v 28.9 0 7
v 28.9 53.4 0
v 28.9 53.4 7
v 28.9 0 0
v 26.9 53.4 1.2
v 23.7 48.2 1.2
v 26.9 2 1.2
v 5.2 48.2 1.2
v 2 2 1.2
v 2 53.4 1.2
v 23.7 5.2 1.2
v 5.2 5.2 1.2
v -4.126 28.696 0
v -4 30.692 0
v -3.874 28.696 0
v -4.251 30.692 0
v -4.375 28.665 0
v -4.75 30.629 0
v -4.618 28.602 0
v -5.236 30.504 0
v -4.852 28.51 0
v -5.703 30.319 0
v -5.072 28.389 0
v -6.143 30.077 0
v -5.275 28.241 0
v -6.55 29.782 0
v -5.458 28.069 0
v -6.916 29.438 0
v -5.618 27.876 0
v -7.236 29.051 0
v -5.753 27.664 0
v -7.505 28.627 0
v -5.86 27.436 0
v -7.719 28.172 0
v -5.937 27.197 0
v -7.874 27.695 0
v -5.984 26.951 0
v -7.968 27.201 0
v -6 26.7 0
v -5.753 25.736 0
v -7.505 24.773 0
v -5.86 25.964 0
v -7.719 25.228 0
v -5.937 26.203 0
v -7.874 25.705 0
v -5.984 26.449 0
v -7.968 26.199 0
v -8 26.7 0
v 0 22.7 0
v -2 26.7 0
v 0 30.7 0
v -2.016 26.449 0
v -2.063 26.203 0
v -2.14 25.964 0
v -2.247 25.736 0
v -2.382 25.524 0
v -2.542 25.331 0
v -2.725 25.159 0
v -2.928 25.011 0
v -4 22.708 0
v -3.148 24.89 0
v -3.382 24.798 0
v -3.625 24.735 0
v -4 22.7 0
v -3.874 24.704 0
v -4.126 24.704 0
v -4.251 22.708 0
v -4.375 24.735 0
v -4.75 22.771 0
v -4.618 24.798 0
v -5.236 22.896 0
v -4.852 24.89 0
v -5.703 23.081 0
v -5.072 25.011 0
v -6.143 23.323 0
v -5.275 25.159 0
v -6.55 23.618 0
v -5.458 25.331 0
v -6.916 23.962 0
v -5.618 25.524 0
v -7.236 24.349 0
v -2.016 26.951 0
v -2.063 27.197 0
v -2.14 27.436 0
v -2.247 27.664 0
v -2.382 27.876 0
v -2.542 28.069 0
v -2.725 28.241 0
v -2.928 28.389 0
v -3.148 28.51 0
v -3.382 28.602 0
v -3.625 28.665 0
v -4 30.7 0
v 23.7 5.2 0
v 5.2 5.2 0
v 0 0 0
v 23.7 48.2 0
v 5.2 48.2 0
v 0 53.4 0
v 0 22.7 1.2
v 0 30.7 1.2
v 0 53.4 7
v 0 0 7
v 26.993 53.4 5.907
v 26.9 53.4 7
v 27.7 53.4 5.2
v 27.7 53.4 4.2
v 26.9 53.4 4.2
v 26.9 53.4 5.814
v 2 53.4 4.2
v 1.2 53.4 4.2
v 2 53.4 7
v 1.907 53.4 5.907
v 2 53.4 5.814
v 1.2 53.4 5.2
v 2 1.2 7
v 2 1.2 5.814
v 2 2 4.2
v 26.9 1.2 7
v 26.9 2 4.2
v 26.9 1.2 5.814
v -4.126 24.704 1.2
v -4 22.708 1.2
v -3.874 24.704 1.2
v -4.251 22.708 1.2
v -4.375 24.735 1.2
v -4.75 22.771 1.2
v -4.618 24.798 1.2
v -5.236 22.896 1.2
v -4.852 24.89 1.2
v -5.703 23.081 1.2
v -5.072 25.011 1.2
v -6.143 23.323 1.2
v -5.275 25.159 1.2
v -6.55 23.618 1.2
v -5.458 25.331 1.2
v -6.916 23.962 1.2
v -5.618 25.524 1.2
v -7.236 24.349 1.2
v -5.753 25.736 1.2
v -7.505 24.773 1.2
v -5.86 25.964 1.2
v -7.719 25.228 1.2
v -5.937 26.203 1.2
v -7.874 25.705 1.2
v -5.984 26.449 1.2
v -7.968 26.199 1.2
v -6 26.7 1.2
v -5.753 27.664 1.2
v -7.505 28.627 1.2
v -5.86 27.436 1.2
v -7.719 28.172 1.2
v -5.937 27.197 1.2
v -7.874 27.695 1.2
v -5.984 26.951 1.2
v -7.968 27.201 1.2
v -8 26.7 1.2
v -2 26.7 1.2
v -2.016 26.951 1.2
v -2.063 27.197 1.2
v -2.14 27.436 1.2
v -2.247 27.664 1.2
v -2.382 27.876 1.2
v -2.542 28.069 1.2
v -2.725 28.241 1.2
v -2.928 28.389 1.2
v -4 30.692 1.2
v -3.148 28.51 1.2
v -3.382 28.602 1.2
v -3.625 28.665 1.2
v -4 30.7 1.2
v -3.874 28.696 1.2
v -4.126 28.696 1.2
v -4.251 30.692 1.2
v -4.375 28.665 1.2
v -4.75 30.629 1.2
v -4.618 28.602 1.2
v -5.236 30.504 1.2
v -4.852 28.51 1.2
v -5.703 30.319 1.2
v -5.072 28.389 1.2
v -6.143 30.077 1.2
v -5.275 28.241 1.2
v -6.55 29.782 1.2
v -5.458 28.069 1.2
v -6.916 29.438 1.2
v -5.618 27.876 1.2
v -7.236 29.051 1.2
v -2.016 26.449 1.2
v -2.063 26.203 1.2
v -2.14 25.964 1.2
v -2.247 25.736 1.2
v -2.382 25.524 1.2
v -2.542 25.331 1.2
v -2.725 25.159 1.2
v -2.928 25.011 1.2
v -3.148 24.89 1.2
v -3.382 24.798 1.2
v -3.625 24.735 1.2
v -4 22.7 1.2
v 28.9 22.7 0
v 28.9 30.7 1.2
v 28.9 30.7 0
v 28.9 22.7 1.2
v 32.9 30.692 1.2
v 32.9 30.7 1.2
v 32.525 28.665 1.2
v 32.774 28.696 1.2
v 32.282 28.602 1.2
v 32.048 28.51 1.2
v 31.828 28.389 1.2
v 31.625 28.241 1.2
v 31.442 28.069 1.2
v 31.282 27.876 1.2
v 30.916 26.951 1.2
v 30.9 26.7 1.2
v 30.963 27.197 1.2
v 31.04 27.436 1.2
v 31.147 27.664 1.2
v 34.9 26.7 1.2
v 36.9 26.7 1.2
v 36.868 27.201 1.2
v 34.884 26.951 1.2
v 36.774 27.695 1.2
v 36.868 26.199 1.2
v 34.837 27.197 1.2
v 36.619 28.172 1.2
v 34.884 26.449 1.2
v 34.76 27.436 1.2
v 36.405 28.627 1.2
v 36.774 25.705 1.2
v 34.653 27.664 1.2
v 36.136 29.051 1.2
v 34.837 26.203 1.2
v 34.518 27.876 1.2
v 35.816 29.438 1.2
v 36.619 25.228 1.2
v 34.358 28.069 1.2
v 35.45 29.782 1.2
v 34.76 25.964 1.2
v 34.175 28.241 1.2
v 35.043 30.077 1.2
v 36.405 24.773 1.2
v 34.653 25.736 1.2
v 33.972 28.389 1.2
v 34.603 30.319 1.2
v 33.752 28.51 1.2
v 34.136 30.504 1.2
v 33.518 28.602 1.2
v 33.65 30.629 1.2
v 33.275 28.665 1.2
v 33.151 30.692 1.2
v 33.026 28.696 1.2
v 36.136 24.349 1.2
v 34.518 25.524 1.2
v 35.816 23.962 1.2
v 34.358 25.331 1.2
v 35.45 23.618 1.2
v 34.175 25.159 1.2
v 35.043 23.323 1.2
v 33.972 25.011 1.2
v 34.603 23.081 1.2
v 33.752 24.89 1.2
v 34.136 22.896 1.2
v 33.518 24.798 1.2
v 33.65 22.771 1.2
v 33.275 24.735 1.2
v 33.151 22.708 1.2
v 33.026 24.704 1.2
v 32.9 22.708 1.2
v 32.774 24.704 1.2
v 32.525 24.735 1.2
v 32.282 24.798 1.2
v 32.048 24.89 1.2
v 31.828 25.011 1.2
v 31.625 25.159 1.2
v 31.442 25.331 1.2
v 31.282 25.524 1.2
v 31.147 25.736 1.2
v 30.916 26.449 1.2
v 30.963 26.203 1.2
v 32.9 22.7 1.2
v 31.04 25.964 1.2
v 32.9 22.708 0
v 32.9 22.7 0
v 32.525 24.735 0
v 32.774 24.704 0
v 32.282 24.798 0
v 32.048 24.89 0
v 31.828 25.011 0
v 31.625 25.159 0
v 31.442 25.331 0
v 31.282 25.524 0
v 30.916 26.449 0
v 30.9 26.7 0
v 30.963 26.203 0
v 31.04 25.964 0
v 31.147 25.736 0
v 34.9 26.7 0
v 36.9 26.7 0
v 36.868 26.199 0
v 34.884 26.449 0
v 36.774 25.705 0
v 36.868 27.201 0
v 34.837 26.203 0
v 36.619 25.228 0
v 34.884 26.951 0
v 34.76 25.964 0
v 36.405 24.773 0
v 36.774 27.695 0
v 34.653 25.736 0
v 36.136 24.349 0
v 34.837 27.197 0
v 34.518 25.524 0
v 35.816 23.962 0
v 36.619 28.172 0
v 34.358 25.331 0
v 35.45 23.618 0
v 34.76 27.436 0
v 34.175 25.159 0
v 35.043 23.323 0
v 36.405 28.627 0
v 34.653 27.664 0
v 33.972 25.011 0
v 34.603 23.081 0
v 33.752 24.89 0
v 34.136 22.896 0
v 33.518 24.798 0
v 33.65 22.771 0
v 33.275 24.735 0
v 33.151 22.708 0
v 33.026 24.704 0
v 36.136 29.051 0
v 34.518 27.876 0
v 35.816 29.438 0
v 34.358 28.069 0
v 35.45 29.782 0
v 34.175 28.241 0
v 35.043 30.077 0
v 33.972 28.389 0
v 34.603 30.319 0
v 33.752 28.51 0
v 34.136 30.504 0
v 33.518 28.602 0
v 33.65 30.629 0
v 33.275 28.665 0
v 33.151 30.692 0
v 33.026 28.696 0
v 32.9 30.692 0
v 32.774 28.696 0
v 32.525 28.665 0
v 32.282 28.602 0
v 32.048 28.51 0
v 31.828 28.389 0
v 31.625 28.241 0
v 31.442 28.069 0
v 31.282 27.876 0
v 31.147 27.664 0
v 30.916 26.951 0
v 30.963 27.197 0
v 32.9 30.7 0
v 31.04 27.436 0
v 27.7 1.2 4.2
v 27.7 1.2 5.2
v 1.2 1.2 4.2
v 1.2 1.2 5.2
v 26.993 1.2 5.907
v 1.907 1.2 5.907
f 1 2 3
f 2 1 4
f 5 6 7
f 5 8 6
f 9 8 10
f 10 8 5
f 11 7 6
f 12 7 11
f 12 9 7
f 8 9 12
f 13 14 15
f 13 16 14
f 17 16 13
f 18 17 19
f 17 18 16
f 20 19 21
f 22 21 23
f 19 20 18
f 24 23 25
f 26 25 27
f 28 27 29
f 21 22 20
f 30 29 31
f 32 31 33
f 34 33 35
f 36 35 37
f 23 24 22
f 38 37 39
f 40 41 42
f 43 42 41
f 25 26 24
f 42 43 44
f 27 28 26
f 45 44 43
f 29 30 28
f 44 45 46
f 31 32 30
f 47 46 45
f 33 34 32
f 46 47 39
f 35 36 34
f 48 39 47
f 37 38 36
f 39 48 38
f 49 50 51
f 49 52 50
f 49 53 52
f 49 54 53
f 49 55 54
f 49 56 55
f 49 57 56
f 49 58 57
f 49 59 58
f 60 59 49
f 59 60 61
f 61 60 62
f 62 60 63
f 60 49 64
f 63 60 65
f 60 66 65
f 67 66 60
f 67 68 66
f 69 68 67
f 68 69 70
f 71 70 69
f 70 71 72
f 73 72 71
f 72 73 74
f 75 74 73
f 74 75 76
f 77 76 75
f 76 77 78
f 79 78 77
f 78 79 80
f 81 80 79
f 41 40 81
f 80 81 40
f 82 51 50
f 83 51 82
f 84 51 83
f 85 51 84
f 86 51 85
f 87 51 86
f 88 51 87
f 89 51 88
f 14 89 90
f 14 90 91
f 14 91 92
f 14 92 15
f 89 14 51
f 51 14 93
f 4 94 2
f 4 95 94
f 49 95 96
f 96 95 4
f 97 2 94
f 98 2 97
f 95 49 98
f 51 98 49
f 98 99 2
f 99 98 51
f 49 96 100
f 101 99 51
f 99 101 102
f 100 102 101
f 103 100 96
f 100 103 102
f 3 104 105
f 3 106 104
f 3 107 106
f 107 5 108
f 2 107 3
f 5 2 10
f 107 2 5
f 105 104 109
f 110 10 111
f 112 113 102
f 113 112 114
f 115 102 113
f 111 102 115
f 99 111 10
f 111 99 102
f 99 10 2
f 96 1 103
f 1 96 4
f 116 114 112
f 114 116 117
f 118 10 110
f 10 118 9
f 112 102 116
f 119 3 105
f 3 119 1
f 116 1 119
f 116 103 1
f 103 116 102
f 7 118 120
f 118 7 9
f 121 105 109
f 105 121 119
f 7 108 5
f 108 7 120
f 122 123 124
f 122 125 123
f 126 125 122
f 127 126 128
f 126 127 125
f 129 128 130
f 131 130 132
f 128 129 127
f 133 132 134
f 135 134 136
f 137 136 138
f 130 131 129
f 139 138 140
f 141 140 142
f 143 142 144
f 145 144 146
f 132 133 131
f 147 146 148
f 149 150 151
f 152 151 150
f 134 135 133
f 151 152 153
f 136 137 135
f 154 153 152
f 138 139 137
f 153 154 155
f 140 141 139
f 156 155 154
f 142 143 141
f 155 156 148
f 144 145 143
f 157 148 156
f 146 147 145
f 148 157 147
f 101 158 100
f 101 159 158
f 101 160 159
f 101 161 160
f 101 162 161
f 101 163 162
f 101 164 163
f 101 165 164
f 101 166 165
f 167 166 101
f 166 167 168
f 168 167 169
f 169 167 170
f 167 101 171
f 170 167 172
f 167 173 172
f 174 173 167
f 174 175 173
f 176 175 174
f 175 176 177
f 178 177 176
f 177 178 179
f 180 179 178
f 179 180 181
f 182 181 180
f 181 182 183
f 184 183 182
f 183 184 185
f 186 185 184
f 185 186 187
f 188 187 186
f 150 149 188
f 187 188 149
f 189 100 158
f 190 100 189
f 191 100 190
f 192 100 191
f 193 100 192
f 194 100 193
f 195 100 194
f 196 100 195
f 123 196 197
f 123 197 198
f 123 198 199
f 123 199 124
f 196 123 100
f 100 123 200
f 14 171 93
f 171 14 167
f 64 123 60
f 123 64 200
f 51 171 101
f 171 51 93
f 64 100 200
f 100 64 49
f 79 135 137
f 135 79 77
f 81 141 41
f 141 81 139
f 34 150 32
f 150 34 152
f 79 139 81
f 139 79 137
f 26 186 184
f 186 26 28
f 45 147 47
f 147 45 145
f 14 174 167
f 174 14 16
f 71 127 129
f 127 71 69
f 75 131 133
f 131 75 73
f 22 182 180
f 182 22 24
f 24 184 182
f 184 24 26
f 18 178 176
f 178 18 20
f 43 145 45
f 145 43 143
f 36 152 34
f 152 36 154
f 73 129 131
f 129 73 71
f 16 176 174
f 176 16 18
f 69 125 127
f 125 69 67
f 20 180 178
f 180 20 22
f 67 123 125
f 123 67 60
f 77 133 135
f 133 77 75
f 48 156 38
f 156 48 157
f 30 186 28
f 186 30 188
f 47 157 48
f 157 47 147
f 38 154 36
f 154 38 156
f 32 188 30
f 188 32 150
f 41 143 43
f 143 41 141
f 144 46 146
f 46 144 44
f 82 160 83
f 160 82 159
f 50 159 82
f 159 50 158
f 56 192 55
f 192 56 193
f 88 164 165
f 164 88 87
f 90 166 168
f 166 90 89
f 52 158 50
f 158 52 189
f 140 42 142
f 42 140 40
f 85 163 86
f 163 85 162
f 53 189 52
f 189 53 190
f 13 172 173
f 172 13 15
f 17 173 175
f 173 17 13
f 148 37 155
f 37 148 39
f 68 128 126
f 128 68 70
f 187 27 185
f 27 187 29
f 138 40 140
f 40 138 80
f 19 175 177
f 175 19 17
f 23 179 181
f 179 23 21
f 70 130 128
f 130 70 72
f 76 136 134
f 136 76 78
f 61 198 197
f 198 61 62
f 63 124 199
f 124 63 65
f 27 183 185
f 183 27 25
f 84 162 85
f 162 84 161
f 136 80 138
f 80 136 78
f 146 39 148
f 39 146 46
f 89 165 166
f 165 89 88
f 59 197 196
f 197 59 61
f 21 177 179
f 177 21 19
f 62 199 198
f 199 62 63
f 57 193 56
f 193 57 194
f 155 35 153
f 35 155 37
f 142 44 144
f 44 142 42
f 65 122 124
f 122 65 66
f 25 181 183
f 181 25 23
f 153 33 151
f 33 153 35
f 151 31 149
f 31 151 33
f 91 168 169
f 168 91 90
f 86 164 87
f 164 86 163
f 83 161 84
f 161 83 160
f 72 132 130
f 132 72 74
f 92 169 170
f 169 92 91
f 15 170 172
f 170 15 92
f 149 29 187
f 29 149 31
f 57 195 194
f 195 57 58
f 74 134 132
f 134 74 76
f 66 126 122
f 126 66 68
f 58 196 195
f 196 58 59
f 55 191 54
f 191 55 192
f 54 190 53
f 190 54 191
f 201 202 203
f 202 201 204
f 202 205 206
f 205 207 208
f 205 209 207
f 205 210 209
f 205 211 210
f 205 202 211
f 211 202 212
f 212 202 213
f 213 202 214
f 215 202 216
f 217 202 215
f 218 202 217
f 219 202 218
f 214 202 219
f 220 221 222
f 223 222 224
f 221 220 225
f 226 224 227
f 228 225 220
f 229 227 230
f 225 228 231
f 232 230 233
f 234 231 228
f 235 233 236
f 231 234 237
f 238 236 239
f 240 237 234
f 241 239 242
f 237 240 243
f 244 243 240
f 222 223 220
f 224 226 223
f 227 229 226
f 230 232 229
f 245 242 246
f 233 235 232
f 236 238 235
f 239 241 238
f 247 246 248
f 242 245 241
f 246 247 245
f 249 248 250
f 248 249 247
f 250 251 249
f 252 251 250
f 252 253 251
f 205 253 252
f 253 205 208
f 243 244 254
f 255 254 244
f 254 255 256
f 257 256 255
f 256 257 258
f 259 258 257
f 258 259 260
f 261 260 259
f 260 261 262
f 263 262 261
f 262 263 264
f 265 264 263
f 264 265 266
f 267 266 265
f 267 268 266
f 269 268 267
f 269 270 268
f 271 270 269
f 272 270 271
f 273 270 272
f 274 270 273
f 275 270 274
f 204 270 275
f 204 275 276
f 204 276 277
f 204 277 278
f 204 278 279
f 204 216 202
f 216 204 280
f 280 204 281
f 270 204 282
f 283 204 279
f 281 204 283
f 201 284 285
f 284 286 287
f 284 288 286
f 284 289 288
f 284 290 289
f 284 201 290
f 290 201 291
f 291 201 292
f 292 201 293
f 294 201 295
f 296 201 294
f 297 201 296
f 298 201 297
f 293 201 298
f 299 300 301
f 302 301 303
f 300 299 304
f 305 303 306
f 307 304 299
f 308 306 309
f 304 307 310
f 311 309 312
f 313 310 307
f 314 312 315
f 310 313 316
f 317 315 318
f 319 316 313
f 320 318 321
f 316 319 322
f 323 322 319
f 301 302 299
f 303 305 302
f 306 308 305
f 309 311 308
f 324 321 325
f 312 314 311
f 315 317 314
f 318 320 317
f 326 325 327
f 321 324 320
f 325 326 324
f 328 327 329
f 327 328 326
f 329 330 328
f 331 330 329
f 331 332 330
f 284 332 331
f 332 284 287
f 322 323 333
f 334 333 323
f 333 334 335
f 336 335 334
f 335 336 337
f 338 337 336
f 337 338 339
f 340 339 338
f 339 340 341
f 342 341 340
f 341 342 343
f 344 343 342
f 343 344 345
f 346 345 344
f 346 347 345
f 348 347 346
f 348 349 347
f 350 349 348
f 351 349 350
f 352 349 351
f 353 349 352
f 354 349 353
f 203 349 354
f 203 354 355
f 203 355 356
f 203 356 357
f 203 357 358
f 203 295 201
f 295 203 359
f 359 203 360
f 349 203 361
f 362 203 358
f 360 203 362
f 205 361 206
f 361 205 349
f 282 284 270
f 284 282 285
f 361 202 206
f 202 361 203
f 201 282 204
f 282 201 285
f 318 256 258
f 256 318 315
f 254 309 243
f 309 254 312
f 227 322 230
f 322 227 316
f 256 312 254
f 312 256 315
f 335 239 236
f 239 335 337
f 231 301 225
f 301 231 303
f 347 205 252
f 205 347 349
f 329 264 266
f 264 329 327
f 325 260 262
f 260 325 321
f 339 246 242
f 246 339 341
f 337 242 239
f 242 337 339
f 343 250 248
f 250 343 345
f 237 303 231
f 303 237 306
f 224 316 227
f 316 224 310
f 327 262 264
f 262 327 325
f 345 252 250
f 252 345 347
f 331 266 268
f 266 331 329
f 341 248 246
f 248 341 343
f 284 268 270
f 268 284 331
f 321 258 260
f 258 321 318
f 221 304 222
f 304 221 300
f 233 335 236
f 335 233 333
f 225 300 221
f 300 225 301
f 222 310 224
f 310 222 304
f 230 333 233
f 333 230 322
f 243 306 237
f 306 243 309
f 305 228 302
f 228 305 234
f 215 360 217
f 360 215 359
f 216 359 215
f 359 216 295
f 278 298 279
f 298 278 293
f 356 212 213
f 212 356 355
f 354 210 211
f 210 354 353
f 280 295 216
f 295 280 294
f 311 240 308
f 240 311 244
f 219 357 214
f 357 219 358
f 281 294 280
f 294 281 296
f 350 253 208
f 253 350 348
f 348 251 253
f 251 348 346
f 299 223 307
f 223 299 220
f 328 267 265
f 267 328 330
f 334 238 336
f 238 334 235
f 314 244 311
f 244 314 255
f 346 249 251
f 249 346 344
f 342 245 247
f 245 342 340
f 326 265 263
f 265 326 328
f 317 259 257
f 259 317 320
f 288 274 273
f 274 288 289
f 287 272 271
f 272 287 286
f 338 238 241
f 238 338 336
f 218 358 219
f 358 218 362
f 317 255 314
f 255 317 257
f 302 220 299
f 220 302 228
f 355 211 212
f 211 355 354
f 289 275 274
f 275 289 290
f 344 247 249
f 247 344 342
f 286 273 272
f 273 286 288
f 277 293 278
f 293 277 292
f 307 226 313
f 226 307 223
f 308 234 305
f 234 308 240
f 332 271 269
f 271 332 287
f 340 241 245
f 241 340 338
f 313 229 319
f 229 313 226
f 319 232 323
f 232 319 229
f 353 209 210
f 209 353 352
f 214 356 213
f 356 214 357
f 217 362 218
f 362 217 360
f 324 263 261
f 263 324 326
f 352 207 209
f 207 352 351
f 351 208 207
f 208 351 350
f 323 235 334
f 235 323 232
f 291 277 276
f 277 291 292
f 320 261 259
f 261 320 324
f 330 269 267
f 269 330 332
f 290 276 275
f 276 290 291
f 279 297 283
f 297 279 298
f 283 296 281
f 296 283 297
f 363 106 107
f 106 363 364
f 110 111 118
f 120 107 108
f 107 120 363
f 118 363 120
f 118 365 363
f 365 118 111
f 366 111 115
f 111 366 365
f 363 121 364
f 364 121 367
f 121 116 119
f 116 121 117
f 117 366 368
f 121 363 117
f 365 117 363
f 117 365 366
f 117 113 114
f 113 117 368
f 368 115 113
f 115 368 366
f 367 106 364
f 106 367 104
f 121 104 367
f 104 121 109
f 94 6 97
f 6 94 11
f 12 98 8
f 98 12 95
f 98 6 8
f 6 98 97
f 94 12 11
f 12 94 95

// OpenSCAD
// file: ../lib/pcb_led_cvf.scad
// for led power module modified

/* bluetooth_mate_holder.scad
 * By John Biehler - November 17, 2011
 * http://www.thingiverse.com/thing:

 * derived from pcb_box_slide_with_tabs.scad
 * By Nicholas C Lewis - Jan 1, 2011
 * http://www.thingiverse.com/thing:5396
 *
 * derived from pcb_box_slide.scad
 *     Parametric, open PCB-box (slide-in) by chlunde
 *     http://www.thingiverse.com/thing:4071
 *
 * CHANGES
 * - adjusted to fit Arduino Mega
 * - added mounting tabs
 * - turned off cutouts
 * - adjusted bottom cutout size
 */

$fn=50;

module pcb_led_cvf(

	pcb_width = 48.2,
	pcb_length =24.1,
	pcb_height =1.1,
	slisse = 0.8,

	pcb_bottom_margin = 1,
	wall_width_thick = 2,
	box_height = 7,

	//tab parameters
	tab_hole_radius=2,
	tab_outer_radius=4,

	inner_margin = 4,

	add_tabs = true

) {
	wall_width = wall_width_thick-slisse;

module tab() {
	difference(){
		union() {
			translate([-tab_outer_radius,-tab_outer_radius,0])
			cube([tab_outer_radius,2*tab_outer_radius,wall_width]);
			translate([-tab_outer_radius,0,0])
				cylinder(r=tab_outer_radius, h = wall_width);
		}
		translate([-tab_outer_radius,0,0])
		 cylinder(r= tab_hole_radius, h = wall_width+3,center=true);
	}

}

module box() {
	union() {
		cube([pcb_width + 2*wall_width, pcb_length + 2*wall_width, wall_width]);

		cube([wall_width_thick, pcb_length + 2*wall_width, box_height]);

		cube([pcb_width + 2*wall_width, wall_width_thick, box_height]);

		%translate([0, pcb_length+wall_width, 0])
			cube([pcb_width + 2*wall_width,wall_width,box_height]);

		translate([pcb_width + wall_width - slisse,0,0])
			cube([wall_width_thick, pcb_length + 2*wall_width, box_height]);
	}
	if(add_tabs) {
//comment out this part to remove tabs
		for(i=[(pcb_length + 2*wall_width)/2]){
	translate([0,i,0])tab();
	translate([pcb_width + 2*wall_width,i,0])mirror()tab();
		}
	}

}

module pcb() {
	translate([wall_width, wall_width, wall_width + pcb_bottom_margin])
		cube([pcb_width,pcb_length + wall_width + 0.1,pcb_height]);
	translate([wall_width, wall_width, wall_width + pcb_bottom_margin+pcb_height])rotate([0,45,0])
		cube([pcb_height,pcb_length + wall_width + 0.1,pcb_height]);
	translate([wall_width+pcb_width-2*cos(45)*pcb_height, wall_width, wall_width + pcb_bottom_margin+pcb_height])rotate([0,45,0])
		cube([pcb_height,pcb_length + wall_width + 0.1,pcb_height]);
	translate([wall_width_thick, wall_width, wall_width + pcb_bottom_margin])
		cube([pcb_width-2*slisse,pcb_length + wall_width + 0.1,box_height]);

}



module holes() {
		*translate([wall_width + pcb_width/2, wall_width_thick + 0.1, pcb_width/2+wall_width])
			rotate(a=90,v=[1,0,0])
				cylinder(r=pcb_width/2, h=wall_width_thick + 0.2);

		*translate([-0.1, wall_width + pcb_length/2, pcb_length/2 + wall_width])
			rotate(a=90,v=[0,1,0])
				cylinder(r=pcb_length/2, h=wall_width_thick + 0.2);

		*translate([pcb_width + wall_width - slisse - 0.1, wall_width + pcb_length/2, pcb_length/2 + wall_width])
			rotate(a=90,v=[0,1,0])
				cylinder(r=pcb_length/2, h=wall_width_thick + 0.2);

	 * translate([pcb_width/2 + wall_width, wall_width + pcb_length/2, -0.1])
			rotate(a=0,v=[0,1,0])
				cylinder(r=min(pcb_length,pcb_width)/2 - wall_width/2, h=wall_width_thick + 0.2);

		translate([inner_margin +wall_width, inner_margin+wall_width, -0.1])
			cube([pcb_width-inner_margin*2,pcb_length -inner_margin*2,wall_width + 0.2]);
}

	difference() {
		box();
		pcb();
		holes();
	}
}



pcb_led_cvf();
// main file
use <../lib/pcb_led_cvf.scad>


pcb_led_cvf(
  pcb_length=51,
  pcb_width=26.5,
  pcb_height=1,
  pcb_bottom_margin=3
);
